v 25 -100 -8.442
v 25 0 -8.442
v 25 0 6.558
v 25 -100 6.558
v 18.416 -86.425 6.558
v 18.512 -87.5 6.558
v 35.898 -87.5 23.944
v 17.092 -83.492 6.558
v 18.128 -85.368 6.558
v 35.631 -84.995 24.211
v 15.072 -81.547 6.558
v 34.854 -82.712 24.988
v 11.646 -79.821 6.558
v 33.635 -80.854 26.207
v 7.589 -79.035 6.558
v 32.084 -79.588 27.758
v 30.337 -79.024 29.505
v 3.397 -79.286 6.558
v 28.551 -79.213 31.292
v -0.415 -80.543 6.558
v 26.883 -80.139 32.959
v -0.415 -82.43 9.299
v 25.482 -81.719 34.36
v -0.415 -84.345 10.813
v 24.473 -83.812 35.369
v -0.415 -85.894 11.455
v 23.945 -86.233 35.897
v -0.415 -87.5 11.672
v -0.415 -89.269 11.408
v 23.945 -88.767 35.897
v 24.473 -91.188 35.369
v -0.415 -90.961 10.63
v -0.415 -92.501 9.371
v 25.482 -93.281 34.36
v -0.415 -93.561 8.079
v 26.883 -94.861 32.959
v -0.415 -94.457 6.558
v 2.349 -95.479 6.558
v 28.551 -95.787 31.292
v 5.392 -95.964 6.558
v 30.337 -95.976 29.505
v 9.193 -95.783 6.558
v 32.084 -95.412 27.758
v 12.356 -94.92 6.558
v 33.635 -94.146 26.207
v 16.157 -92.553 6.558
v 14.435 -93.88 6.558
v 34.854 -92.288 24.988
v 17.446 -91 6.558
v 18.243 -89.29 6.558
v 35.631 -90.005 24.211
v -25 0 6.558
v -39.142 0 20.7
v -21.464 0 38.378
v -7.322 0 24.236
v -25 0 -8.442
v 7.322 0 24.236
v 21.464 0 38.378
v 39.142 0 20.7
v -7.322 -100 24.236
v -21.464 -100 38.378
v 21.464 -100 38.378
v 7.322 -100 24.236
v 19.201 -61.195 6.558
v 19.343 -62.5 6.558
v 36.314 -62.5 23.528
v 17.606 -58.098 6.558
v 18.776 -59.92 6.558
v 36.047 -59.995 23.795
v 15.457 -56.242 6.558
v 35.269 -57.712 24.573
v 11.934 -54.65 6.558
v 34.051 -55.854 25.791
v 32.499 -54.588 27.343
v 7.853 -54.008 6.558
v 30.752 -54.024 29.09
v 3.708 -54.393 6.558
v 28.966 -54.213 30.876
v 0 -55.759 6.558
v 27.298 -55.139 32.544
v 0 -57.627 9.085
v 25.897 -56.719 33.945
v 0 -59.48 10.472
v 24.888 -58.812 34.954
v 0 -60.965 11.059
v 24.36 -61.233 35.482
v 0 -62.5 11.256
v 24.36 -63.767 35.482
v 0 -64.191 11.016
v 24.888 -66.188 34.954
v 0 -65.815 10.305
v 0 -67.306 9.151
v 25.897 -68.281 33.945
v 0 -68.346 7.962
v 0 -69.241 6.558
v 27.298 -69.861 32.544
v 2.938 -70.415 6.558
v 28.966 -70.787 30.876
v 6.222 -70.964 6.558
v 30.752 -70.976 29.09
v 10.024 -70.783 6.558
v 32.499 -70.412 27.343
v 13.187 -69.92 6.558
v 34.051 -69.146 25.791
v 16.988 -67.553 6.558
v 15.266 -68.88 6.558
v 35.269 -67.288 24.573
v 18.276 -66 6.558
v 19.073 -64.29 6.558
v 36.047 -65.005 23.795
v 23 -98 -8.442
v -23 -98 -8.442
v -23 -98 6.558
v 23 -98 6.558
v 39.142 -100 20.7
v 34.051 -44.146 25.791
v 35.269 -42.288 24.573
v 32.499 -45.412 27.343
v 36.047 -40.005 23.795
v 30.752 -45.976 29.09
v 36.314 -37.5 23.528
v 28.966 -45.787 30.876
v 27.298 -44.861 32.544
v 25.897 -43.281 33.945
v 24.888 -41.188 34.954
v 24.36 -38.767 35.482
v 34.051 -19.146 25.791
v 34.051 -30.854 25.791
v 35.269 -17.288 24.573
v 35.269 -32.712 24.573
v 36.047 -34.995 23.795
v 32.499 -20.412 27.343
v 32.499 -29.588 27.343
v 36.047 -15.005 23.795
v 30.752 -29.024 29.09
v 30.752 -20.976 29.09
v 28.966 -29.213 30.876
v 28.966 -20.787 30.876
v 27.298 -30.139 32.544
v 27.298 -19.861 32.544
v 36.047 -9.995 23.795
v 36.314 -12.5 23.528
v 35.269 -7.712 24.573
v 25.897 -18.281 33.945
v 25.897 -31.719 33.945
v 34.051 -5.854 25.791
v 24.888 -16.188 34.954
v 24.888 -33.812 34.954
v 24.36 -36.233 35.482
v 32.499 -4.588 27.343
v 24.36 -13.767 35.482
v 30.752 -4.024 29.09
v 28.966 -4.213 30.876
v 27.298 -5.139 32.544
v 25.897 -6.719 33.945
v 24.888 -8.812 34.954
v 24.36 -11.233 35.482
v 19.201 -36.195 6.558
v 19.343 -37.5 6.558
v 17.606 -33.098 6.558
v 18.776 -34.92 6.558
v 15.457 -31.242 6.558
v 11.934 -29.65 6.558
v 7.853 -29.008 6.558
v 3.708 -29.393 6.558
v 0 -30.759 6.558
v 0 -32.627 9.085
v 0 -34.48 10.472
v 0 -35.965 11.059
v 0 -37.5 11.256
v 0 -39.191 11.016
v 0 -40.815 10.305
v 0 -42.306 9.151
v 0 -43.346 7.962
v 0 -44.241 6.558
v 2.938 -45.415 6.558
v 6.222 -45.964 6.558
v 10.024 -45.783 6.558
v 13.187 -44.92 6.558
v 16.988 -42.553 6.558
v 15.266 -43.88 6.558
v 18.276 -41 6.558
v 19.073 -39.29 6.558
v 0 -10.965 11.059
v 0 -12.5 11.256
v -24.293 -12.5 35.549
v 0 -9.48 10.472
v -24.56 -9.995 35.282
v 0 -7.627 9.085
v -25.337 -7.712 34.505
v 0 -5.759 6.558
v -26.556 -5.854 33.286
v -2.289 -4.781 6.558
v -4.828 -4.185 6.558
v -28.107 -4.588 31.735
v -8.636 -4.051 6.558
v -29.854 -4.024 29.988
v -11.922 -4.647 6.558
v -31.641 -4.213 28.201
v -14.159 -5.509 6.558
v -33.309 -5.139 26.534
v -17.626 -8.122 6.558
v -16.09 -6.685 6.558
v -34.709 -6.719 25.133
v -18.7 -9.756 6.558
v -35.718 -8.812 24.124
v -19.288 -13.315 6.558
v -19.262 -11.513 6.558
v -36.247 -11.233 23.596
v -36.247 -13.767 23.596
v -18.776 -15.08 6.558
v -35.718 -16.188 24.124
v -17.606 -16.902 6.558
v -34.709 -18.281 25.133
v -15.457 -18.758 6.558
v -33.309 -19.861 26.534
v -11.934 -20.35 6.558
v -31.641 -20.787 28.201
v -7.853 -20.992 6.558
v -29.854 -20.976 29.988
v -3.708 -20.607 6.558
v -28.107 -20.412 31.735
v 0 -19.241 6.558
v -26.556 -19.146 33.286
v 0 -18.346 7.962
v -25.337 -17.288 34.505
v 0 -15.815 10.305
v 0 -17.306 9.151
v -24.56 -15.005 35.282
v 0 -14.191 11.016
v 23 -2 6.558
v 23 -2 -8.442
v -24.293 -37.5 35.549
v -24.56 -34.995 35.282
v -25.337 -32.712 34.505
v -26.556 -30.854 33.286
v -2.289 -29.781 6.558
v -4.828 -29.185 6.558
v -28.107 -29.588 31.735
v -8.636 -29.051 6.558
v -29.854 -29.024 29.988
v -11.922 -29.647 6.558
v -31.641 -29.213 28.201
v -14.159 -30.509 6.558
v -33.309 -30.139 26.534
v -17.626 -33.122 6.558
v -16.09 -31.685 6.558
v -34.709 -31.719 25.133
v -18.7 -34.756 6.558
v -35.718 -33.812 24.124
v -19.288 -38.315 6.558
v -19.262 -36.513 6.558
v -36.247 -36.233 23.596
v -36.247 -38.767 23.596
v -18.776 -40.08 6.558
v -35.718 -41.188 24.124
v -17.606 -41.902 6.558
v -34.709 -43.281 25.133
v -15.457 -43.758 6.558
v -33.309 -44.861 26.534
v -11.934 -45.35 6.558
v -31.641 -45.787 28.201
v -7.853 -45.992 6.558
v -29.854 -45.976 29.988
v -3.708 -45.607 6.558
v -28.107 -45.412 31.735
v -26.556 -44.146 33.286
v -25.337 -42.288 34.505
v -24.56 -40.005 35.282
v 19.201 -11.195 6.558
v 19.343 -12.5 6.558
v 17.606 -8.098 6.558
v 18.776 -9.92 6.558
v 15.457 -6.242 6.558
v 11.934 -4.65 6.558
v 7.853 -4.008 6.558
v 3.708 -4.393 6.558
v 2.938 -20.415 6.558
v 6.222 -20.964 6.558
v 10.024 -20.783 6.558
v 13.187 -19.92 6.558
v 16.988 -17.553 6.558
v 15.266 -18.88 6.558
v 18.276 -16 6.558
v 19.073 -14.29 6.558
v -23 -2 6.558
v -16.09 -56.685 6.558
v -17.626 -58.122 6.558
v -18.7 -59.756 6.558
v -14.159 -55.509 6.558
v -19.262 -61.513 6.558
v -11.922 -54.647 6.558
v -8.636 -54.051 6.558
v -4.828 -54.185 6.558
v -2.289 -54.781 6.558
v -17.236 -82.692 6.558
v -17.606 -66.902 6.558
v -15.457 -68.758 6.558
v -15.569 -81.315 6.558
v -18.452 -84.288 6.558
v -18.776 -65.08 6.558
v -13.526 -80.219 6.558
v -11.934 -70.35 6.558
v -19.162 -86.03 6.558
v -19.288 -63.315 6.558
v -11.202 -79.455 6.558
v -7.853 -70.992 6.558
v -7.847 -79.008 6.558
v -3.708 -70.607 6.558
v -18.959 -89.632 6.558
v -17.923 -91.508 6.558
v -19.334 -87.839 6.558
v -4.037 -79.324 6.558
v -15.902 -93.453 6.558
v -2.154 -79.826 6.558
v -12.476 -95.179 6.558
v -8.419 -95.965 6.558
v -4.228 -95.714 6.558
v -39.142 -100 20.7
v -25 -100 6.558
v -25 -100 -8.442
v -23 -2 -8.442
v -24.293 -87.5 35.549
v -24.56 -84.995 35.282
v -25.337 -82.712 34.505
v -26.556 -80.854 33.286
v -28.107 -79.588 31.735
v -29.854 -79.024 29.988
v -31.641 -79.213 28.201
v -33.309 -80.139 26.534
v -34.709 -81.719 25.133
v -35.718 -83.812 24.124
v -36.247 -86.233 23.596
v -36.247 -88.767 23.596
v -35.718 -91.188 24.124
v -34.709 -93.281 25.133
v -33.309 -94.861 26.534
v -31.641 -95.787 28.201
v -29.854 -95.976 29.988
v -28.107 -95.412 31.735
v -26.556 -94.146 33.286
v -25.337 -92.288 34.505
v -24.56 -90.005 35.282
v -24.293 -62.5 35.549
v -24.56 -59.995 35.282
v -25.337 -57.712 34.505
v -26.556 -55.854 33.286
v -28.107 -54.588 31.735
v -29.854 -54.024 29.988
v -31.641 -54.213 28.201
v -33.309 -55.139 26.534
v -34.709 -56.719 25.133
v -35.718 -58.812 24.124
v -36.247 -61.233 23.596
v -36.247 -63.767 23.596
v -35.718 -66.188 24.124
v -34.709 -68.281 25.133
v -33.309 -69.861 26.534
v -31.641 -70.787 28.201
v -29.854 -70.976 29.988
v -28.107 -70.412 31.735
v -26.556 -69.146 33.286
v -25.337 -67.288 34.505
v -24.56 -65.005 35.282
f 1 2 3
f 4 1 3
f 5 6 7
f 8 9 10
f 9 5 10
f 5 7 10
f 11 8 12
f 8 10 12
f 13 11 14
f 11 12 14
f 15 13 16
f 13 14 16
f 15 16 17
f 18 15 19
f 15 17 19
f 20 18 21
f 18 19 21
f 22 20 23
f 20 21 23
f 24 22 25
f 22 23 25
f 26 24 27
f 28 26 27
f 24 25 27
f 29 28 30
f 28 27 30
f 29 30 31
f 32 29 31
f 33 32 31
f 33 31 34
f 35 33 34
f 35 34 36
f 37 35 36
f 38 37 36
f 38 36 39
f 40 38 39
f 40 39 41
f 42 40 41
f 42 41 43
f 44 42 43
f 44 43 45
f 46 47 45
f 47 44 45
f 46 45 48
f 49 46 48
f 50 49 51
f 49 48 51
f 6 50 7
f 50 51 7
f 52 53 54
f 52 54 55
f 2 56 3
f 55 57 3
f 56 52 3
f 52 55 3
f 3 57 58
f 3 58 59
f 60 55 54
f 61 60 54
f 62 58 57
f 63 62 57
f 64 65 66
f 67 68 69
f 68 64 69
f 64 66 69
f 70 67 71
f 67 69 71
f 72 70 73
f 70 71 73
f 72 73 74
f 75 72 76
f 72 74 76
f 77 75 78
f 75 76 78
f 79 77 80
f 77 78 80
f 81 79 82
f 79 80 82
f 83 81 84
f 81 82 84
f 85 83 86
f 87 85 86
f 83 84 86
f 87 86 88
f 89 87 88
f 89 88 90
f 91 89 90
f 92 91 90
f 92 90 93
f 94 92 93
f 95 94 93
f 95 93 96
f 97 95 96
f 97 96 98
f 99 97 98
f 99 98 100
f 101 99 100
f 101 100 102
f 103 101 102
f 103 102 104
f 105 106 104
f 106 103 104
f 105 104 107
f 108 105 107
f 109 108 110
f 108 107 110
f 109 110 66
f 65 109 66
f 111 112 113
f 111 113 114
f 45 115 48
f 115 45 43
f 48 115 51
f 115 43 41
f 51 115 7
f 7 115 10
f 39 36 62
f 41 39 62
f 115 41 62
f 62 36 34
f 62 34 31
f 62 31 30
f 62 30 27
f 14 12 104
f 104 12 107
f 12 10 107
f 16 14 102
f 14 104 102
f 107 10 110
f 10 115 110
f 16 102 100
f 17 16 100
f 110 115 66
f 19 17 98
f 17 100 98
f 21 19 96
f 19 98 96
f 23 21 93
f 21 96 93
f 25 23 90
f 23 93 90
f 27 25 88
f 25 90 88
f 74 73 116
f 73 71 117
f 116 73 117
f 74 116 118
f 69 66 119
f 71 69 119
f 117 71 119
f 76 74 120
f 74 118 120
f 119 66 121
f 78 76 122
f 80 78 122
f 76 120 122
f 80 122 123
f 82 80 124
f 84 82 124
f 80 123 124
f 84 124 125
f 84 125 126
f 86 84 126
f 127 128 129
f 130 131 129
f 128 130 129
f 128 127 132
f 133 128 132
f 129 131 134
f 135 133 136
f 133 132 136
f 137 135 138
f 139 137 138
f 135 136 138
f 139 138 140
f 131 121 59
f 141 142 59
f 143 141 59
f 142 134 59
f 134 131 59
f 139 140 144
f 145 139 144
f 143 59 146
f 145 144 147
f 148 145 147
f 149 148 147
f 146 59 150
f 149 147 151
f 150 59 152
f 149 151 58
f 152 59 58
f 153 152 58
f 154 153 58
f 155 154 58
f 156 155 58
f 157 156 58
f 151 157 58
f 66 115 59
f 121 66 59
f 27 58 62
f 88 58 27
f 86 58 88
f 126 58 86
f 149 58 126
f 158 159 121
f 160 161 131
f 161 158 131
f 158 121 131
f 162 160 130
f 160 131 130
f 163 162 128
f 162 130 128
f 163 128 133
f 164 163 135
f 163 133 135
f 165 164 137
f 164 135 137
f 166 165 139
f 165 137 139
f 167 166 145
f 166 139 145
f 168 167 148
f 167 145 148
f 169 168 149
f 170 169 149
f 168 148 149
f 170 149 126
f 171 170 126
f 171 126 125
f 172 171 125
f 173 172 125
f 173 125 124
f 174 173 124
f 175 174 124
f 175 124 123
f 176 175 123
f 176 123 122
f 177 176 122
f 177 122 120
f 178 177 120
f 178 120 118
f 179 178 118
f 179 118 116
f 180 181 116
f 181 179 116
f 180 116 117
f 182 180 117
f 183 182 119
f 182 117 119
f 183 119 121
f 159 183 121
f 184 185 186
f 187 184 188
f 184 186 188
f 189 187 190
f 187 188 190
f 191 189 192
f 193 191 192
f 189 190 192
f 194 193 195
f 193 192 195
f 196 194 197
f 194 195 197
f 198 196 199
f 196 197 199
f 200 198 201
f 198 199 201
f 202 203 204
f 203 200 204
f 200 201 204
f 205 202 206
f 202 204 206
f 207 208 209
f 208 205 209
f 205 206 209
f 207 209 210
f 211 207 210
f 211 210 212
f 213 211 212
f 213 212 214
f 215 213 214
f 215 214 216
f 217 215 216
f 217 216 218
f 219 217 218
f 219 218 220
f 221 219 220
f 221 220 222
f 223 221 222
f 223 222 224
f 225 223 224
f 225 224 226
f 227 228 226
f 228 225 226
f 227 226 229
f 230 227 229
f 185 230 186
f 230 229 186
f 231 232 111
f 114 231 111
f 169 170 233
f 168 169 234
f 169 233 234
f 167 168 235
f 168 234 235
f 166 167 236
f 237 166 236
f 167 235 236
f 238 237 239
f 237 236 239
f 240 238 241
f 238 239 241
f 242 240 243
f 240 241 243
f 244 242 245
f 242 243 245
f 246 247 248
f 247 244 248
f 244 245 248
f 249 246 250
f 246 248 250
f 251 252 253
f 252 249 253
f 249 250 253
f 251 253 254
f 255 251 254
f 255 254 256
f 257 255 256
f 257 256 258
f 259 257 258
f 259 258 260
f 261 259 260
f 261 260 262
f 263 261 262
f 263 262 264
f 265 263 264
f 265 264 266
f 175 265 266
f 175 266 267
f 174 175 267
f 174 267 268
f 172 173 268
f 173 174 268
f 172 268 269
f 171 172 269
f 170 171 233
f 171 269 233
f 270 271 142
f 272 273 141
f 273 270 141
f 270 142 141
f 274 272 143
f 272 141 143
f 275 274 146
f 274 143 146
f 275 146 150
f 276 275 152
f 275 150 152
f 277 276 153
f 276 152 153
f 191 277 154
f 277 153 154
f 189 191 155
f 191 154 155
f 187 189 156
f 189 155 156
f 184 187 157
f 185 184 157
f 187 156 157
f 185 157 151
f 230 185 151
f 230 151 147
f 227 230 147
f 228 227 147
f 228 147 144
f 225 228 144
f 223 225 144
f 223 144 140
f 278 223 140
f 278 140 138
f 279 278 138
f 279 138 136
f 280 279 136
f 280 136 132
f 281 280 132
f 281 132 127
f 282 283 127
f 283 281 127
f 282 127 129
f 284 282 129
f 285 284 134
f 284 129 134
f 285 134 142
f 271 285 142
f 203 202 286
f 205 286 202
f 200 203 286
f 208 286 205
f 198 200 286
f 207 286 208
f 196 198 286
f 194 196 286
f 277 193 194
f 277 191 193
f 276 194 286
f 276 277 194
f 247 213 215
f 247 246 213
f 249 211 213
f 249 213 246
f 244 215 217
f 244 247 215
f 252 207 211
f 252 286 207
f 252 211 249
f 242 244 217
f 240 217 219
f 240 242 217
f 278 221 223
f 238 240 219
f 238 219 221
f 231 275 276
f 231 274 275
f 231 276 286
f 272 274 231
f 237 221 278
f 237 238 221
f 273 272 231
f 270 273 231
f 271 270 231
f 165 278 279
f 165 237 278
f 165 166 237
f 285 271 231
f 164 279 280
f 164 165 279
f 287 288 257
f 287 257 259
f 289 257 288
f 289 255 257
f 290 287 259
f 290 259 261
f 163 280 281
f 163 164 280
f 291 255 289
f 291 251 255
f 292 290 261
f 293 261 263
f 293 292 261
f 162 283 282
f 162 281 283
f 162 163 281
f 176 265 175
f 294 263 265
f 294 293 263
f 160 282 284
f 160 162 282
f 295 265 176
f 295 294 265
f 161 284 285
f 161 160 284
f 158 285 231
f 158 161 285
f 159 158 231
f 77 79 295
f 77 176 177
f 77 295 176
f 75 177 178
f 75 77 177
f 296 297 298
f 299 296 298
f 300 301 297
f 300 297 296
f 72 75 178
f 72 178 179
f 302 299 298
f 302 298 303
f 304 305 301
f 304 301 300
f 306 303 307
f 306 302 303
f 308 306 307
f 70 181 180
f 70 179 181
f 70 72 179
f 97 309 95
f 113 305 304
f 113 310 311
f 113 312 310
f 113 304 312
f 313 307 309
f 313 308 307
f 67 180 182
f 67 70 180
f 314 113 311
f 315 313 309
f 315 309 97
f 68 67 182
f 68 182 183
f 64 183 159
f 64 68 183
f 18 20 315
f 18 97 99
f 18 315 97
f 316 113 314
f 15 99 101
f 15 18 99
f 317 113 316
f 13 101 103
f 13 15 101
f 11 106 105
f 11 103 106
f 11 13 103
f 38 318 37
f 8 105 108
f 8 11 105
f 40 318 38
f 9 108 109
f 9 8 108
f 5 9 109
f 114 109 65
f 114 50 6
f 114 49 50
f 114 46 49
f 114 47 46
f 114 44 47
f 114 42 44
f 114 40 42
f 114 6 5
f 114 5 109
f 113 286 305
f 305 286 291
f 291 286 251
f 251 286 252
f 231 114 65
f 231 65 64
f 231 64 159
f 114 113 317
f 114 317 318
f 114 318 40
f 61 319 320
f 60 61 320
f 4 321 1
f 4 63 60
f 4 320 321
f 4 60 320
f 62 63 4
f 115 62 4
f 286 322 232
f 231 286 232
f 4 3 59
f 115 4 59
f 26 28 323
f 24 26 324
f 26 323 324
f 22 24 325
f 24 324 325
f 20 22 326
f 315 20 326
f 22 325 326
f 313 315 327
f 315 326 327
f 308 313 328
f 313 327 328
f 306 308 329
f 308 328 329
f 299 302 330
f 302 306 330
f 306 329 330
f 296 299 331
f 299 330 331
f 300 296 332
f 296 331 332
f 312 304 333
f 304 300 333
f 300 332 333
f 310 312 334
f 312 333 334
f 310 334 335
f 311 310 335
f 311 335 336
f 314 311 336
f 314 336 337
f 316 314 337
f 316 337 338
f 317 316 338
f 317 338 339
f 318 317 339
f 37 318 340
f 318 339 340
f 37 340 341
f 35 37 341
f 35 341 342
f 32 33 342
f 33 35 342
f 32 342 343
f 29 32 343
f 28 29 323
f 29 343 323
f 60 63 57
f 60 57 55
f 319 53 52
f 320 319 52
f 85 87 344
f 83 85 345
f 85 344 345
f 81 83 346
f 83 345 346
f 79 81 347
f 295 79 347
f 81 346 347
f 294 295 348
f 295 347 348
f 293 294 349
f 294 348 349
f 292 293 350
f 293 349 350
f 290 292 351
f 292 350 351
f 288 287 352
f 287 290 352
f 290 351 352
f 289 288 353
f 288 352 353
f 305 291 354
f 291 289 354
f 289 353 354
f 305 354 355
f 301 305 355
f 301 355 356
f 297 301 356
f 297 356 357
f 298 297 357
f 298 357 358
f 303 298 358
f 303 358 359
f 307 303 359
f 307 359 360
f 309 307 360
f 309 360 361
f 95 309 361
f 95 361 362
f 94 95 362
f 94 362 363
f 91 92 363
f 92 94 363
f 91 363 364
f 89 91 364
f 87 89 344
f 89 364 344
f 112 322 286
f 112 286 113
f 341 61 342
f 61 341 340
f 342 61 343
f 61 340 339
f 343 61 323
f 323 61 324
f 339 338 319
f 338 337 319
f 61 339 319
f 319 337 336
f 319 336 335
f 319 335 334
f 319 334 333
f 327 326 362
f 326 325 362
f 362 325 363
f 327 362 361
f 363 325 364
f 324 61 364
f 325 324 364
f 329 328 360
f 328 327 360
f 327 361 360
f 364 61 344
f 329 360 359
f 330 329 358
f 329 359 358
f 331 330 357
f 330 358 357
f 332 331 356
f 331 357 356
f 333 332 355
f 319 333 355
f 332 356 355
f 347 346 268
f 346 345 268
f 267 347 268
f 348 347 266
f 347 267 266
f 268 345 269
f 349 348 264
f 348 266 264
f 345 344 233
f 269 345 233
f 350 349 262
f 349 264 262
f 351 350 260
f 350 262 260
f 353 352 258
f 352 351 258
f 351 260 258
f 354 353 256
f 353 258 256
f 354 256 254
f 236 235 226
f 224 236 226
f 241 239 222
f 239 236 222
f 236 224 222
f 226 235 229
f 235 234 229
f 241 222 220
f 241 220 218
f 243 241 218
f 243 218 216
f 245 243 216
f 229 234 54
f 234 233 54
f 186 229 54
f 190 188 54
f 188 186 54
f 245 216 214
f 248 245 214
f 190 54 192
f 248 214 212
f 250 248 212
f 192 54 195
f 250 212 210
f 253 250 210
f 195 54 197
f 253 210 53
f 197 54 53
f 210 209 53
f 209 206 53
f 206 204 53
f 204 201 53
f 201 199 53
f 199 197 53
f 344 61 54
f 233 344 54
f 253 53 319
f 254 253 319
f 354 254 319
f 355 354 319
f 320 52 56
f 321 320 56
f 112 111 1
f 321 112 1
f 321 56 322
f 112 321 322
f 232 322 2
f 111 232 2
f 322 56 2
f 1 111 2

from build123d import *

# Parameters (mm, degrees)
F1_DEPTH = 100
F2_W     = 46
F2_H     = 96
F3_DEPTH = 15
F4_R     = 8.5
F5_DEPTH = 50.2
F6_R     = 8.5
F7_DEPTH = 63.4


with BuildPart() as f1:
    # F0 (on Front) → F1 (new body)
    with BuildSketch(Plane.XZ):
        Polygon((-25, -8.442136), (0, -8.442136), (25, -8.442136), (25, 6.557864), (39.142136, 20.7), (21.464466, 38.377669), (7.32233, 24.235533), (0, 24.235533), (-7.32233, 24.235533), (-21.464466, 38.377669), (-39.142136, 20.7), (-25, 6.557864), align=None)
    extrude(amount=F1_DEPTH)

    # F2 (on face) → F3 (cut)
    with BuildSketch(Plane(origin=(0, 0, -8.442136), x_dir=(1, 0, 0), z_dir=(0, 0, -1))):
        with Locations((0, 50)):
            Rectangle(F2_W, F2_H)
    extrude(amount=-F3_DEPTH, mode=Mode.SUBTRACT)

    # F4 (on face) → F5 (cut)
    with BuildSketch(Plane(origin=(29.921068, 0, 29.921068), x_dir=(0.707107, 0, -0.707107), z_dir=(0.707107, 0, 0.707107))):
        with Locations((-0.046836, -87.5)):
            Circle(F4_R)
        with Locations((0.54056, -62.5)):
            Circle(F4_R)
        with Locations((0.54056, -37.5)):
            Circle(F4_R)
        with Locations((0.54056, -12.5)):
            Circle(F4_R)
    extrude(amount=-F5_DEPTH, mode=Mode.SUBTRACT)

    # F6 (on face) → F7 (cut)
    with BuildSketch(Plane(origin=(-29.921068, 0, 29.921068), x_dir=(0.707107, 0, 0.707107), z_dir=(-0.707107, 0, 0.707107))):
        with Locations((-0.54056, -12.5)):
            Circle(F6_R)
        with Locations((-0.54056, -37.5)):
            Circle(F6_R)
        with Locations((-0.54056, -62.5)):
            Circle(F6_R)
        with Locations((-0.54056, -87.5)):
            Circle(F6_R)
    extrude(amount=-F7_DEPTH, mode=Mode.SUBTRACT)


solid = f1.part
